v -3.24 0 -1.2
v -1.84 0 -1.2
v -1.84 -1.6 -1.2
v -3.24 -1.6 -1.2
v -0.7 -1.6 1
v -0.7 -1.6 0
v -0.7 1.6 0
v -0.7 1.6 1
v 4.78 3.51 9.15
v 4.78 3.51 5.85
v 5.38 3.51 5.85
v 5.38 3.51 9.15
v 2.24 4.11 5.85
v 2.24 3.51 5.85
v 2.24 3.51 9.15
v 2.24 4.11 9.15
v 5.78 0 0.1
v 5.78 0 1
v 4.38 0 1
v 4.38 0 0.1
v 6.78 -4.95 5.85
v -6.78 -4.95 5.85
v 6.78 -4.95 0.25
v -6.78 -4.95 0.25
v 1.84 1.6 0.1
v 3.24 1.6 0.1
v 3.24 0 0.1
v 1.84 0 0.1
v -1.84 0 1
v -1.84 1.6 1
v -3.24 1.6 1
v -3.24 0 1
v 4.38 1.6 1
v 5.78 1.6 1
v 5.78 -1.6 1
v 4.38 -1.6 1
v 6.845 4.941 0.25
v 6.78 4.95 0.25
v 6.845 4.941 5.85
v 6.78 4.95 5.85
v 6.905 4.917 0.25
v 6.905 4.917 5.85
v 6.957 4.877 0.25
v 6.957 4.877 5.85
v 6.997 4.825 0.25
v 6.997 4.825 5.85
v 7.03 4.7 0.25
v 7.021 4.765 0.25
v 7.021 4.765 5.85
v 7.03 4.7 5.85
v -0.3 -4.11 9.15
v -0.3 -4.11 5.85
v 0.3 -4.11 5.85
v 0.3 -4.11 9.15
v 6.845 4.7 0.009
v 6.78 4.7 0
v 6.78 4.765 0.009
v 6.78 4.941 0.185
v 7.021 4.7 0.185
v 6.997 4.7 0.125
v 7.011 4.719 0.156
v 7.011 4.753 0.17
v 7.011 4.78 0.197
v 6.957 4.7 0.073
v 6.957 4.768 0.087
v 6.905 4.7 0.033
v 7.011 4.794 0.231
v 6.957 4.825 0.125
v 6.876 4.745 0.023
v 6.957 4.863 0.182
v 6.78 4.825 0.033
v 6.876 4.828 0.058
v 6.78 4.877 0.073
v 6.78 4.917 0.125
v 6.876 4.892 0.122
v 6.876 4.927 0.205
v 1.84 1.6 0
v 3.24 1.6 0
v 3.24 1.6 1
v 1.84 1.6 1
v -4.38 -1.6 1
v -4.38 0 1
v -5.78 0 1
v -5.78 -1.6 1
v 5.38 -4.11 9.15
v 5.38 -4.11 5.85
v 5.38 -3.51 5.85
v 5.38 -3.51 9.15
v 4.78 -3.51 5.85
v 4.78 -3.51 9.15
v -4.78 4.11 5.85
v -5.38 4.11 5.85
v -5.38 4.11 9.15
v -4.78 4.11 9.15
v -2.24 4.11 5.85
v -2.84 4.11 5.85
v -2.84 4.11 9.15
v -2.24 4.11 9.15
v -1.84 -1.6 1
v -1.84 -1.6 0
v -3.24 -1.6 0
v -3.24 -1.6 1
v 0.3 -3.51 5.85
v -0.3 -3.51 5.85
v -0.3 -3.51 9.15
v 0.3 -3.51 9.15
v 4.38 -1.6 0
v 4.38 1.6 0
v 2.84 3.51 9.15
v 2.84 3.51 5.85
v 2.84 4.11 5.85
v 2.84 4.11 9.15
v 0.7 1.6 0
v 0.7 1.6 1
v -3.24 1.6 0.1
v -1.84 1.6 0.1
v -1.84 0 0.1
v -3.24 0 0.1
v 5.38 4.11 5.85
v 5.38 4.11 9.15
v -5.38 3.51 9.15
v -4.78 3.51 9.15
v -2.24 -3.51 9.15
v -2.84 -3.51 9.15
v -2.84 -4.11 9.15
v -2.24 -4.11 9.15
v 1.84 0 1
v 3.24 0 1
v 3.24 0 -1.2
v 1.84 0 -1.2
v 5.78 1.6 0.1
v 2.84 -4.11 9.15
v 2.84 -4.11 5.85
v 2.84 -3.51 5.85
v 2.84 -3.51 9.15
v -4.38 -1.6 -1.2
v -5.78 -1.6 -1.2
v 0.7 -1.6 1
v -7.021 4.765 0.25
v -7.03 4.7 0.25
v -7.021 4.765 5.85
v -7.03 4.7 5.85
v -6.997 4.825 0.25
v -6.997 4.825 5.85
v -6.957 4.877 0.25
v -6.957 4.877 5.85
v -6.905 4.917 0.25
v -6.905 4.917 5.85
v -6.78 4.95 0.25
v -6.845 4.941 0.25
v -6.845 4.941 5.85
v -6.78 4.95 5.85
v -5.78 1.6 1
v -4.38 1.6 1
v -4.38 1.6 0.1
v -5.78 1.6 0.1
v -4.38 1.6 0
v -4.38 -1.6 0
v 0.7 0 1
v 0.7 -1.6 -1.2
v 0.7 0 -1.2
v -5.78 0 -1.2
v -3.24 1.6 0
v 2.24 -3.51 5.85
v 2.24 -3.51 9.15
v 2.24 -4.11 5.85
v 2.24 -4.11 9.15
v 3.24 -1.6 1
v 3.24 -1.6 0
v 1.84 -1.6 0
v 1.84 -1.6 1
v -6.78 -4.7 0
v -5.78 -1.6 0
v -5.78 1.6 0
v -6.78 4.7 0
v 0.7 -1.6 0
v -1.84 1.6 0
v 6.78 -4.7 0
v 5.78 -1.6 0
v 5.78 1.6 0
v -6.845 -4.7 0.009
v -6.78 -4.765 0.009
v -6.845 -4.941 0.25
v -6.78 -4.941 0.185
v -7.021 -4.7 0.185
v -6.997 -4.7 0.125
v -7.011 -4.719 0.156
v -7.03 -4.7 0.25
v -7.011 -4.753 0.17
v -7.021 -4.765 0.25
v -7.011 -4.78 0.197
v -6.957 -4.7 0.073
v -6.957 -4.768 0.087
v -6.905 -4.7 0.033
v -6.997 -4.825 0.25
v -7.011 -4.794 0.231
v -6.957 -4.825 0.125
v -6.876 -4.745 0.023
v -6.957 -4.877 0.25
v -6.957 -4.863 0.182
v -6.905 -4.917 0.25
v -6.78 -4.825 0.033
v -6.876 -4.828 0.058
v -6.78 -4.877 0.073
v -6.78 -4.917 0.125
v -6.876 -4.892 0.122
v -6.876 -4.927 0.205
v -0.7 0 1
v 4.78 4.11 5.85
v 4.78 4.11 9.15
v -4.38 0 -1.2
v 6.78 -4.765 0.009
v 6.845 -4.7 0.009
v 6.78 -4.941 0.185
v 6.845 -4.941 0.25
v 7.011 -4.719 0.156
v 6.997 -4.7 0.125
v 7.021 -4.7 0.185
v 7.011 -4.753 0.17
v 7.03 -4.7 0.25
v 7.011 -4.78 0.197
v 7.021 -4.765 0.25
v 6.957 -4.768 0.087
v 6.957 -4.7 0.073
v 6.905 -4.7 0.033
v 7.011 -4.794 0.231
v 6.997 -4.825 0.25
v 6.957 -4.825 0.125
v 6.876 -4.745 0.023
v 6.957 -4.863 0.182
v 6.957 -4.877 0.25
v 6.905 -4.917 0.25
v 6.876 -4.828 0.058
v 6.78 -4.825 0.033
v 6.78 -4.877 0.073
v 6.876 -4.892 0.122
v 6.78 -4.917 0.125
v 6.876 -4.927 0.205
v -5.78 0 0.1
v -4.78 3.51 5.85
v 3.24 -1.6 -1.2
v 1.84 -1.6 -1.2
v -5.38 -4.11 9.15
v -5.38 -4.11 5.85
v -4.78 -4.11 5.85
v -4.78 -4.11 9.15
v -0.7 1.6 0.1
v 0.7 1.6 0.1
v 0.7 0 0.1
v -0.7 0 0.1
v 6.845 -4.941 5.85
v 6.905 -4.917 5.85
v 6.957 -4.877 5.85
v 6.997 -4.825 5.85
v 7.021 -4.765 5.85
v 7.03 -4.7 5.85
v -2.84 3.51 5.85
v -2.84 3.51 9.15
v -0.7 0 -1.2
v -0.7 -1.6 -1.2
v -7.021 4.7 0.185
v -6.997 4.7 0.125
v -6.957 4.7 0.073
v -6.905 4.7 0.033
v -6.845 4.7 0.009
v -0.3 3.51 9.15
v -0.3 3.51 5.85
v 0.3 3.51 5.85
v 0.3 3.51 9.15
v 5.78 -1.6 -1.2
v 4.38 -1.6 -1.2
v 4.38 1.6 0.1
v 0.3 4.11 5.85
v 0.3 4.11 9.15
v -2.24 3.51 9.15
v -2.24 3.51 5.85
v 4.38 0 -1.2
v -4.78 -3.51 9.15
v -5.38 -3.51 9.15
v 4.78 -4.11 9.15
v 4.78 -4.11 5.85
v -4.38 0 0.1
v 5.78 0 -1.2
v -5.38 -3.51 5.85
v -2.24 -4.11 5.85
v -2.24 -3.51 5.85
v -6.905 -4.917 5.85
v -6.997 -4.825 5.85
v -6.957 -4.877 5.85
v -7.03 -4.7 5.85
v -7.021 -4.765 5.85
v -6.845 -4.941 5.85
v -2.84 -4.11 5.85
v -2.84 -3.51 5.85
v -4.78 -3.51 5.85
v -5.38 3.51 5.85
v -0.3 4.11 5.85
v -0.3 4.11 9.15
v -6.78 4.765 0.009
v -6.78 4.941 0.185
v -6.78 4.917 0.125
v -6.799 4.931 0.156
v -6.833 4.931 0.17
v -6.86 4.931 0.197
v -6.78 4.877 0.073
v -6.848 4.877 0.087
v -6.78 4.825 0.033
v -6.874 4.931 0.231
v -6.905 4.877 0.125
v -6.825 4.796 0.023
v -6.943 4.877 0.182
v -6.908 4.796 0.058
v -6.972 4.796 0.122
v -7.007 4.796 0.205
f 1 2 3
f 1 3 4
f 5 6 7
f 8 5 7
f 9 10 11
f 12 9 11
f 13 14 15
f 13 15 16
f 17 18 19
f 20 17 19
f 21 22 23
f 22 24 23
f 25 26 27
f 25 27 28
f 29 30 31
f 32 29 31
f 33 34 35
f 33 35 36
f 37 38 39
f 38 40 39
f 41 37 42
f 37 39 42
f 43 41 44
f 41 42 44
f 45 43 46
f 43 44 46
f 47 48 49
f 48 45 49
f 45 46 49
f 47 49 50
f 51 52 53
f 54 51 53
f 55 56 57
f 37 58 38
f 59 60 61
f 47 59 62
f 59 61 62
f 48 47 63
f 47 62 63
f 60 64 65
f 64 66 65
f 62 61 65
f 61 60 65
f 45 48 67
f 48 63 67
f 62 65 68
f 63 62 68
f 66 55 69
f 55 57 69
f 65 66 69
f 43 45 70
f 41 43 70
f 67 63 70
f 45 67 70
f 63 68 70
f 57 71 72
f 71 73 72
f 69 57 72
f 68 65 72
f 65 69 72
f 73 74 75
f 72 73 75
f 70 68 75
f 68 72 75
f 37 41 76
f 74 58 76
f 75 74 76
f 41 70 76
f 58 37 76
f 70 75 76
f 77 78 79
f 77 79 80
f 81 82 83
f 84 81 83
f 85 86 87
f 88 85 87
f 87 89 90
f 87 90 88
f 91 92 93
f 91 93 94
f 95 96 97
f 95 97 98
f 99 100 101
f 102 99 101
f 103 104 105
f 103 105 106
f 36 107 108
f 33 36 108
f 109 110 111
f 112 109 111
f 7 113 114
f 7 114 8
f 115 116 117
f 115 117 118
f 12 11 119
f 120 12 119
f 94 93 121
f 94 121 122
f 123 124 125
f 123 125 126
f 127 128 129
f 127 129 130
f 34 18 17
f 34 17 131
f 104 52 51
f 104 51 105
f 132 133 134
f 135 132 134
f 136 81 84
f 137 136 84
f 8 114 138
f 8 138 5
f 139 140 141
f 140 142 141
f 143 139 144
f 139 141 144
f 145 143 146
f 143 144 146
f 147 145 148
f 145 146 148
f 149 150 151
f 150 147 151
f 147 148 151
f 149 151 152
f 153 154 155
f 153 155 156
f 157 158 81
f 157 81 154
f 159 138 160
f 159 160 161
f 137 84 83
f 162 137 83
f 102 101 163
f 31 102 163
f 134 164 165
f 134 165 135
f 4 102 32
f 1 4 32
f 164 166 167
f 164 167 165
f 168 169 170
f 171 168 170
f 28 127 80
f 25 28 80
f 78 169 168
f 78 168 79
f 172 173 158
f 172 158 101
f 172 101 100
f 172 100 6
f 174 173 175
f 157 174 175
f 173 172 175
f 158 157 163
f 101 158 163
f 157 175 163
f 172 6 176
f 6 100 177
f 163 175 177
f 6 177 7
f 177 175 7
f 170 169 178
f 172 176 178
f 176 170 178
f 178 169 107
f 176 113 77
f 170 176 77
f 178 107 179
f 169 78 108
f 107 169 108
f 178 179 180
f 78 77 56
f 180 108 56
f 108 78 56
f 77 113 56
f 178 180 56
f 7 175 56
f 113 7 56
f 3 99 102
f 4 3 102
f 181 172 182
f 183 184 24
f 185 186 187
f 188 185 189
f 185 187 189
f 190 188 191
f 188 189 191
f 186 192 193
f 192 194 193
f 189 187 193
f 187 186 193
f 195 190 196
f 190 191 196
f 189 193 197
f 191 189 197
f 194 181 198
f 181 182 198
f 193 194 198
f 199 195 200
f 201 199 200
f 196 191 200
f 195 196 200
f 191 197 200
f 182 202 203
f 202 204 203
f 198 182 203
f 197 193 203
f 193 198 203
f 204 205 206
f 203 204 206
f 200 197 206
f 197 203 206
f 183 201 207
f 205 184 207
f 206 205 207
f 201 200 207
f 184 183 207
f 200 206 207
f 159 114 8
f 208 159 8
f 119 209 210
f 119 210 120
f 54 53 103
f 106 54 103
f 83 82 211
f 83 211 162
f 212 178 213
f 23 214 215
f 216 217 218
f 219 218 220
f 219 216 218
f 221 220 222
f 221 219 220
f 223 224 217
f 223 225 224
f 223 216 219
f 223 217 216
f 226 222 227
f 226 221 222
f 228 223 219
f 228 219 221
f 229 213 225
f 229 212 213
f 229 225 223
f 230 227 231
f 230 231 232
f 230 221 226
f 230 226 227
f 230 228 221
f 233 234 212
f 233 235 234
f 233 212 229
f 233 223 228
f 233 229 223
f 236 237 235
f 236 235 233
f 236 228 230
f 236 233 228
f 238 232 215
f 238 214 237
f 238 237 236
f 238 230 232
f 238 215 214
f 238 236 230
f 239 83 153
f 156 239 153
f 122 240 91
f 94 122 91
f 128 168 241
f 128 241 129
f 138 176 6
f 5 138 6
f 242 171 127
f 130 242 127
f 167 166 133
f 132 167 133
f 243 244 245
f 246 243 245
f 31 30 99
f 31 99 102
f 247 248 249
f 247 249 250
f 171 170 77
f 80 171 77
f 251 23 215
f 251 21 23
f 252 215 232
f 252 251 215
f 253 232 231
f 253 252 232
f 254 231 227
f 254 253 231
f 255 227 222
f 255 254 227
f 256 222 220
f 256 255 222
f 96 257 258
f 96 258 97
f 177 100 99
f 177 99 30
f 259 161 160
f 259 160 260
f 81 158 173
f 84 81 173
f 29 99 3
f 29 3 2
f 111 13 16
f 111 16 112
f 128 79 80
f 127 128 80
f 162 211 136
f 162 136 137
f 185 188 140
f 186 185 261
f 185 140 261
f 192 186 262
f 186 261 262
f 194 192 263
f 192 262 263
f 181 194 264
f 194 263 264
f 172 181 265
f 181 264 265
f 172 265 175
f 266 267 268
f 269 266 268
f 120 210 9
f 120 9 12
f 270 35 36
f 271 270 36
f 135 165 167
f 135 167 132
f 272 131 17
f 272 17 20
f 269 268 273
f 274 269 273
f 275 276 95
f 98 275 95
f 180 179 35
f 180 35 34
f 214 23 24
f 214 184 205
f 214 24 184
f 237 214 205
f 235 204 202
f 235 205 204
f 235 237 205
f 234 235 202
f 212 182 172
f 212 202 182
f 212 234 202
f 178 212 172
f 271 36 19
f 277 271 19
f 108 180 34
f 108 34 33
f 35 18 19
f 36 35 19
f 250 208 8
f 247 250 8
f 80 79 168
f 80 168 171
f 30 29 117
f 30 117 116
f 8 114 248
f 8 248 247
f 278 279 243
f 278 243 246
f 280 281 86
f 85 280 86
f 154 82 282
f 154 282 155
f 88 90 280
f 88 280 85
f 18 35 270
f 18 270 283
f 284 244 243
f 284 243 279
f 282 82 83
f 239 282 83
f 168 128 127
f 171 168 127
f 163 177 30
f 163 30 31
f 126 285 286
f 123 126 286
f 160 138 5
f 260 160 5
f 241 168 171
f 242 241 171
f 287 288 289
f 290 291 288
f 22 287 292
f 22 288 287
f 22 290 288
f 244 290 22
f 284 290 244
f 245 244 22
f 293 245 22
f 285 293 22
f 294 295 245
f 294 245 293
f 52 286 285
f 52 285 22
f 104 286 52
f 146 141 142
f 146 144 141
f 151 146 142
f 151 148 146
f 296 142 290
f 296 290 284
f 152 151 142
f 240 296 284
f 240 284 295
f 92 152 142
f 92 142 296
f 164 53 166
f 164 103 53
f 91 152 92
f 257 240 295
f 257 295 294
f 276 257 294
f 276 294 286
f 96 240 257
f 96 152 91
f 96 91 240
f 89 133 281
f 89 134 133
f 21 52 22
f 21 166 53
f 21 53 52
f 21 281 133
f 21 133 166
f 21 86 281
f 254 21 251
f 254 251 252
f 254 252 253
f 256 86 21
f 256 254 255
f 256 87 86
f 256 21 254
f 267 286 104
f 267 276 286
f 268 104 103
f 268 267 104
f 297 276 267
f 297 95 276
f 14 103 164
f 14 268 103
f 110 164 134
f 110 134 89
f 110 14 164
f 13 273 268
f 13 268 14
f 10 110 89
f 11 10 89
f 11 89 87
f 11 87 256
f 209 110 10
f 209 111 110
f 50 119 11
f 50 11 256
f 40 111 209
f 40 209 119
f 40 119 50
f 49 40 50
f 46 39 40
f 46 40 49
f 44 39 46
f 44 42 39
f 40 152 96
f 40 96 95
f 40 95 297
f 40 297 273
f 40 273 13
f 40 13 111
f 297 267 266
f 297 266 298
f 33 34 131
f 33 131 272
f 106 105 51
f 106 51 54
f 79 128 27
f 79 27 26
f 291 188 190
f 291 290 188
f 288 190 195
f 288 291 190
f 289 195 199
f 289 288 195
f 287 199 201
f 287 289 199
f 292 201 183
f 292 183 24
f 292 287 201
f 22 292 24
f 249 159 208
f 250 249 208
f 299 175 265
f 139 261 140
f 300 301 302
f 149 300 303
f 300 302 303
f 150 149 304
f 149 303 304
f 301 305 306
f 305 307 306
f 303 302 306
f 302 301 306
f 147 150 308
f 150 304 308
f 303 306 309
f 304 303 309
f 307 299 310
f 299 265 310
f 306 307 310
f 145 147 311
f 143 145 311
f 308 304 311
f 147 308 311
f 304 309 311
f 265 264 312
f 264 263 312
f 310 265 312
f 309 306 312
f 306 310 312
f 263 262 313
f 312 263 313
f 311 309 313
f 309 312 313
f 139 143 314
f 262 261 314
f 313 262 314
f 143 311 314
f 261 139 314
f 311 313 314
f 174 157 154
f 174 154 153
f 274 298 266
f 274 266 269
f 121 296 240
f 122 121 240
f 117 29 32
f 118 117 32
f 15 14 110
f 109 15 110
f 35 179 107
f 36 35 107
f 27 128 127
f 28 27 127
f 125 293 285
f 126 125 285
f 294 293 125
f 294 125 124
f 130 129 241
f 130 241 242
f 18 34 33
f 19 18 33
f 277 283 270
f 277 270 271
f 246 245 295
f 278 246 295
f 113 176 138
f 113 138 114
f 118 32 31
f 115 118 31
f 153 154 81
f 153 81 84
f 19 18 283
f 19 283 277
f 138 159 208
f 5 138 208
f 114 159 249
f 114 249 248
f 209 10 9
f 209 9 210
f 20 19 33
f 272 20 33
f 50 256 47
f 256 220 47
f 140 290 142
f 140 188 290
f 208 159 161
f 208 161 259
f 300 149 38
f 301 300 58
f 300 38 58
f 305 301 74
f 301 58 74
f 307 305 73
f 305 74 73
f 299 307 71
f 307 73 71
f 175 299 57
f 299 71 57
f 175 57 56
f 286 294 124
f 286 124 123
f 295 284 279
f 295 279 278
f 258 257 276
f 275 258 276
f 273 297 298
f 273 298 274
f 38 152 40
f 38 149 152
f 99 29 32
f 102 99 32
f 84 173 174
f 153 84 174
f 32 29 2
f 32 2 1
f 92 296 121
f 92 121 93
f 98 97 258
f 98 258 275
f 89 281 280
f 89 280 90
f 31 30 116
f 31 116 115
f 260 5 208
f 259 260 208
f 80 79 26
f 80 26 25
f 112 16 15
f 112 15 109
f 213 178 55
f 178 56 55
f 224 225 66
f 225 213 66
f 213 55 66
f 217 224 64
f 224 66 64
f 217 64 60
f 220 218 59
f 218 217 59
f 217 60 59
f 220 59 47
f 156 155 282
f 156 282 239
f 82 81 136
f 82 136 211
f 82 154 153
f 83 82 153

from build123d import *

# Parameters (mm, degrees)
IZIM1_W                       = 14.06
IZIM1_H                       = 9.9
Y_KSEKLIK_EKSTR_ZYON1_DEPTH   = 5.85
IZIM2_W                       = 1.4
IZIM2_H                       = 3.2
KES_EKSTR_ZYON1_DEPTH         = 1
IZIM3_W                       = 1.4
IZIM3_H                       = 1.6
Y_KSEKLIK_EKSTR_ZYON2_DEPTH   = 2.2
Y_KSEKLIK_EKSTR_ZYON2_2_DEPTH = 2.2
Y_KSEKLIK_EKSTR_ZYON2_3_DEPTH = 2.2
Y_KSEKLIK_EKSTR_ZYON2_4_DEPTH = 2.2
Y_KSEKLIK_EKSTR_ZYON2_5_DEPTH = 2.2
IZIM4_W                       = 1.4
IZIM4_H                       = 1.6
Y_KSEKLIK_EKSTR_ZYON3_DEPTH   = 0.9
Y_KSEKLIK_EKSTR_ZYON3_2_DEPTH = 0.9
Y_KSEKLIK_EKSTR_ZYON3_3_DEPTH = 0.9
Y_KSEKLIK_EKSTR_ZYON3_4_DEPTH = 0.9
Y_KSEKLIK_EKSTR_ZYON3_5_DEPTH = 0.9
RADYUS1_R                     = 0.25
IZIM5_W                       = 0.6
IZIM5_H                       = 0.6
Y_KSEKLIK_EKSTR_ZYON4_DEPTH   = 3.3


with BuildPart() as part:
    # Çizim1 → Yükseklik-Ekstrüzyon1 (new body)
    with BuildSketch(Plane.XY):
        Rectangle(IZIM1_W, IZIM1_H)
    extrude(amount=Y_KSEKLIK_EKSTR_ZYON1_DEPTH)

    # Çizim2 → Kes-Ekstrüzyon1 (cut)
    with BuildSketch(Plane(origin=(0, 0, 0), x_dir=(-1, 0, 0), z_dir=(0, 0, -1))):
        with Locations((-5.08, 0)):
            Rectangle(IZIM2_W, IZIM2_H)
        with Locations((-2.54, 0)):
            Rectangle(IZIM2_W, IZIM2_H)
        Rectangle(IZIM2_W, IZIM2_H)
        with Locations((2.54, 0)):
            Rectangle(IZIM2_W, IZIM2_H)
        with Locations((5.08, 0)):
            Rectangle(IZIM2_W, IZIM2_H)
    extrude(amount=-KES_EKSTR_ZYON1_DEPTH, mode=Mode.SUBTRACT)

    # Radyus1
    radyus1_edges = [part.edges().sort_by_distance(p)[0] for p in [
        (0, -4.95, 0),
        (-7.03, 0, 0),
        (0, 4.95, 0),
        (7.03, 0, 0),
        (7.03, -4.95, 2.925),
        (-7.03, -4.95, 2.925),
        (-7.03, 4.95, 2.925),
        (7.03, 4.95, 2.925),
    ]]
    fillet(radyus1_edges, radius=RADYUS1_R)

    # Çizim5 → Yükseklik-Ekstrüzyon4 (add)
    with BuildSketch(Plane.XY.offset(5.85)):
        with Locations((-5.08, -3.81)):
            Rectangle(IZIM5_W, IZIM5_H)
        with Locations((-5.08, 3.81)):
            Rectangle(IZIM5_W, IZIM5_H)
        with Locations((-2.54, -3.81)):
            Rectangle(IZIM5_W, IZIM5_H)
        with Locations((-2.54, 3.81)):
            Rectangle(IZIM5_W, IZIM5_H)
        with Locations((0, 3.81)):
            Rectangle(IZIM5_W, IZIM5_H)
        with Locations((0, -3.81)):
            Rectangle(IZIM5_W, IZIM5_H)
        with Locations((2.54, -3.81)):
            Rectangle(IZIM5_W, IZIM5_H)
        with Locations((2.54, 3.81)):
            Rectangle(IZIM5_W, IZIM5_H)
        with Locations((5.08, -3.81)):
            Rectangle(IZIM5_W, IZIM5_H)
        with Locations((5.08, 3.81)):
            Rectangle(IZIM5_W, IZIM5_H)
    extrude(amount=Y_KSEKLIK_EKSTR_ZYON4_DEPTH)


with BuildPart() as body_2:
    # Çizim3 → Yükseklik-Ekstrüzyon2 (new body)
    with BuildSketch(Plane(origin=(0, 0, 1), x_dir=(-1, 0, 0), z_dir=(0, 0, -1))):
        with Locations((-5.08, -0.8)):
            Rectangle(IZIM3_W, IZIM3_H)
    extrude(amount=Y_KSEKLIK_EKSTR_ZYON2_DEPTH)


with BuildPart() as body_3:
    # Çizim3 → Y_kseklik-Ekstr_zyon2 2 (new body)
    with BuildSketch(Plane(origin=(0, 0, 1), x_dir=(-1, 0, 0), z_dir=(0, 0, -1))):
        with Locations((-2.54, -0.8)):
            Rectangle(IZIM3_W, IZIM3_H)
    extrude(amount=Y_KSEKLIK_EKSTR_ZYON2_2_DEPTH)


with BuildPart() as body_4:
    # Çizim3 → Y_kseklik-Ekstr_zyon2 3 (new body)
    with BuildSketch(Plane(origin=(0, 0, 1), x_dir=(-1, 0, 0), z_dir=(0, 0, -1))):
        with Locations((0, -0.8)):
            Rectangle(IZIM3_W, IZIM3_H)
    extrude(amount=Y_KSEKLIK_EKSTR_ZYON2_3_DEPTH)


with BuildPart() as body_5:
    # Çizim3 → Y_kseklik-Ekstr_zyon2 4 (new body)
    with BuildSketch(Plane(origin=(0, 0, 1), x_dir=(-1, 0, 0), z_dir=(0, 0, -1))):
        with Locations((2.54, -0.8)):
            Rectangle(IZIM3_W, IZIM3_H)
    extrude(amount=Y_KSEKLIK_EKSTR_ZYON2_4_DEPTH)


with BuildPart() as body_6:
    # Çizim3 → Y_kseklik-Ekstr_zyon2 5 (new body)
    with BuildSketch(Plane(origin=(0, 0, 1), x_dir=(-1, 0, 0), z_dir=(0, 0, -1))):
        with Locations((5.08, -0.8)):
            Rectangle(IZIM3_W, IZIM3_H)
    extrude(amount=Y_KSEKLIK_EKSTR_ZYON2_5_DEPTH)


with BuildPart() as body_7:
    # Çizim4 → Yükseklik-Ekstrüzyon3 (new body)
    with BuildSketch(Plane(origin=(0, 0, 1), x_dir=(-1, 0, 0), z_dir=(0, 0, -1))):
        with Locations((-5.08, 0.8)):
            Rectangle(IZIM4_W, IZIM4_H)
    extrude(amount=Y_KSEKLIK_EKSTR_ZYON3_DEPTH)


with BuildPart() as body_8:
    # Çizim4 → Y_kseklik-Ekstr_zyon3 2 (new body)
    with BuildSketch(Plane(origin=(0, 0, 1), x_dir=(-1, 0, 0), z_dir=(0, 0, -1))):
        with Locations((-2.54, 0.8)):
            Rectangle(IZIM4_W, IZIM4_H)
    extrude(amount=Y_KSEKLIK_EKSTR_ZYON3_2_DEPTH)


with BuildPart() as body_9:
    # Çizim4 → Y_kseklik-Ekstr_zyon3 3 (new body)
    with BuildSketch(Plane(origin=(0, 0, 1), x_dir=(-1, 0, 0), z_dir=(0, 0, -1))):
        with Locations((0, 0.8)):
            Rectangle(IZIM4_W, IZIM4_H)
    extrude(amount=Y_KSEKLIK_EKSTR_ZYON3_3_DEPTH)


with BuildPart() as body_10:
    # Çizim4 → Y_kseklik-Ekstr_zyon3 4 (new body)
    with BuildSketch(Plane(origin=(0, 0, 1), x_dir=(-1, 0, 0), z_dir=(0, 0, -1))):
        with Locations((2.54, 0.8)):
            Rectangle(IZIM4_W, IZIM4_H)
    extrude(amount=Y_KSEKLIK_EKSTR_ZYON3_4_DEPTH)


with BuildPart() as body_11:
    # Çizim4 → Y_kseklik-Ekstr_zyon3 5 (new body)
    with BuildSketch(Plane(origin=(0, 0, 1), x_dir=(-1, 0, 0), z_dir=(0, 0, -1))):
        with Locations((5.08, 0.8)):
            Rectangle(IZIM4_W, IZIM4_H)
    extrude(amount=Y_KSEKLIK_EKSTR_ZYON3_5_DEPTH)


solid = Compound([part.part, body_2.part, body_3.part, body_4.part, body_5.part, body_6.part, body_7.part, body_8.part, body_9.part, body_10.part, body_11.part])
